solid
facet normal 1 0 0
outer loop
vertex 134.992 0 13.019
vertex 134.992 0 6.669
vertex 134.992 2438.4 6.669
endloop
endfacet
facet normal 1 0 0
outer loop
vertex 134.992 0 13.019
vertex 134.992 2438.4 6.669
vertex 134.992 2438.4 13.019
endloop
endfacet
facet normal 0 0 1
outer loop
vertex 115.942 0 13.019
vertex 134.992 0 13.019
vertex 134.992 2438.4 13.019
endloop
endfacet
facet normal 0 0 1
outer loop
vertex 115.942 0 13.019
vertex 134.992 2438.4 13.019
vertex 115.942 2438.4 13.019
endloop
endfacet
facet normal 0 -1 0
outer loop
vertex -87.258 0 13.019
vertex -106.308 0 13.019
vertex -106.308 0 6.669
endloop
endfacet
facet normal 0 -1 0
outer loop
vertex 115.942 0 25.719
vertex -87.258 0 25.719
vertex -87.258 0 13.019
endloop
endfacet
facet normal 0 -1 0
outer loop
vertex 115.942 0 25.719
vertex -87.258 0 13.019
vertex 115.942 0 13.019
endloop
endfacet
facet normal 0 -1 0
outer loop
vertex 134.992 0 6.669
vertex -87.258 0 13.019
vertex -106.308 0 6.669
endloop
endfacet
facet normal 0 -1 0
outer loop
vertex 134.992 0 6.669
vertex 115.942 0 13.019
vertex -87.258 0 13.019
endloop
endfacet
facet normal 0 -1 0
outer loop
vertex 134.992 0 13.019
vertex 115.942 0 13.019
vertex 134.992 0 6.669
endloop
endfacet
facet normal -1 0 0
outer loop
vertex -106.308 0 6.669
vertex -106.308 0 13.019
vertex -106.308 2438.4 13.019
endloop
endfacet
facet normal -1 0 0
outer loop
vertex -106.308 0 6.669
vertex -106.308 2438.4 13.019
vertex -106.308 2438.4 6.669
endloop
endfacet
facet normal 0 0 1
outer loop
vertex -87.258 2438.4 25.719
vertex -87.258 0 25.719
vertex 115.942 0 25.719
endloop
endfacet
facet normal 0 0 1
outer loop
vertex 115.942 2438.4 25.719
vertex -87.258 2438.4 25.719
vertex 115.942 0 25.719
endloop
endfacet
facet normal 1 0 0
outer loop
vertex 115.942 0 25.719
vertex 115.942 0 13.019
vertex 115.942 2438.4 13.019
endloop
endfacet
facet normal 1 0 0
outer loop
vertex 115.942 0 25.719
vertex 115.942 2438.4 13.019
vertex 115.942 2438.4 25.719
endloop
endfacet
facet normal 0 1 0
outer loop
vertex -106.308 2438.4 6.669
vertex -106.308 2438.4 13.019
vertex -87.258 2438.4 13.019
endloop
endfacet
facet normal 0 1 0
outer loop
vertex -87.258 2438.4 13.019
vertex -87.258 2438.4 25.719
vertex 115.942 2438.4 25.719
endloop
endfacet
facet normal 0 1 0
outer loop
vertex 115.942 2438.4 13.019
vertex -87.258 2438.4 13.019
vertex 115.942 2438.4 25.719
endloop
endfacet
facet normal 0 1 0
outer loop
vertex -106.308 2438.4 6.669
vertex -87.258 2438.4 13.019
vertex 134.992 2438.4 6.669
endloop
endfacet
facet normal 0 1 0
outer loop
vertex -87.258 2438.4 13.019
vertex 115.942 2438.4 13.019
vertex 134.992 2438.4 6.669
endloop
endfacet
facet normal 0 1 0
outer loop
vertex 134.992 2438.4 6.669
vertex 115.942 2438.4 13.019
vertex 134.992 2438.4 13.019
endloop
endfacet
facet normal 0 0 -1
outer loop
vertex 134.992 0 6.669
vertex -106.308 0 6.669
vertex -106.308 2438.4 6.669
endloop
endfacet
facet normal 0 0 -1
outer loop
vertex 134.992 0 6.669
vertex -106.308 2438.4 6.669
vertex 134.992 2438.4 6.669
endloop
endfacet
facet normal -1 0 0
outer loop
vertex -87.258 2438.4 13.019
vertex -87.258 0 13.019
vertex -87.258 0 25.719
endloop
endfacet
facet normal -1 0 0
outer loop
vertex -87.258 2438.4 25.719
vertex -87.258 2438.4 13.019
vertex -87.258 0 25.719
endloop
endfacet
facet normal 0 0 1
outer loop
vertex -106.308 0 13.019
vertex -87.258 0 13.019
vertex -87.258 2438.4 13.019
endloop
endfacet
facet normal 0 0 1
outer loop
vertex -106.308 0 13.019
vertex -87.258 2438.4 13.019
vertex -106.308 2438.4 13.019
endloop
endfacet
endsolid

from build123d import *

# Parameters (mm, degrees)
F0_W     = 203.2
F0_H     = 12.7
F1_DEPTH = 2438.4


with BuildPart() as f1:
    # F0 (on Front) → F1 (new body)
    with BuildSketch(Plane.XZ):
        with Locations((14.341989, 19.369072)):
            Rectangle(F0_W, F0_H)
        Polygon((115.941989, 13.019072), (-87.258011, 13.019072), (-106.308011, 13.019072), (-106.308011, 6.669072), (134.991989, 6.669072), (134.991989, 13.019072), align=None)
    extrude(amount=-F1_DEPTH)


solid = f1.part
